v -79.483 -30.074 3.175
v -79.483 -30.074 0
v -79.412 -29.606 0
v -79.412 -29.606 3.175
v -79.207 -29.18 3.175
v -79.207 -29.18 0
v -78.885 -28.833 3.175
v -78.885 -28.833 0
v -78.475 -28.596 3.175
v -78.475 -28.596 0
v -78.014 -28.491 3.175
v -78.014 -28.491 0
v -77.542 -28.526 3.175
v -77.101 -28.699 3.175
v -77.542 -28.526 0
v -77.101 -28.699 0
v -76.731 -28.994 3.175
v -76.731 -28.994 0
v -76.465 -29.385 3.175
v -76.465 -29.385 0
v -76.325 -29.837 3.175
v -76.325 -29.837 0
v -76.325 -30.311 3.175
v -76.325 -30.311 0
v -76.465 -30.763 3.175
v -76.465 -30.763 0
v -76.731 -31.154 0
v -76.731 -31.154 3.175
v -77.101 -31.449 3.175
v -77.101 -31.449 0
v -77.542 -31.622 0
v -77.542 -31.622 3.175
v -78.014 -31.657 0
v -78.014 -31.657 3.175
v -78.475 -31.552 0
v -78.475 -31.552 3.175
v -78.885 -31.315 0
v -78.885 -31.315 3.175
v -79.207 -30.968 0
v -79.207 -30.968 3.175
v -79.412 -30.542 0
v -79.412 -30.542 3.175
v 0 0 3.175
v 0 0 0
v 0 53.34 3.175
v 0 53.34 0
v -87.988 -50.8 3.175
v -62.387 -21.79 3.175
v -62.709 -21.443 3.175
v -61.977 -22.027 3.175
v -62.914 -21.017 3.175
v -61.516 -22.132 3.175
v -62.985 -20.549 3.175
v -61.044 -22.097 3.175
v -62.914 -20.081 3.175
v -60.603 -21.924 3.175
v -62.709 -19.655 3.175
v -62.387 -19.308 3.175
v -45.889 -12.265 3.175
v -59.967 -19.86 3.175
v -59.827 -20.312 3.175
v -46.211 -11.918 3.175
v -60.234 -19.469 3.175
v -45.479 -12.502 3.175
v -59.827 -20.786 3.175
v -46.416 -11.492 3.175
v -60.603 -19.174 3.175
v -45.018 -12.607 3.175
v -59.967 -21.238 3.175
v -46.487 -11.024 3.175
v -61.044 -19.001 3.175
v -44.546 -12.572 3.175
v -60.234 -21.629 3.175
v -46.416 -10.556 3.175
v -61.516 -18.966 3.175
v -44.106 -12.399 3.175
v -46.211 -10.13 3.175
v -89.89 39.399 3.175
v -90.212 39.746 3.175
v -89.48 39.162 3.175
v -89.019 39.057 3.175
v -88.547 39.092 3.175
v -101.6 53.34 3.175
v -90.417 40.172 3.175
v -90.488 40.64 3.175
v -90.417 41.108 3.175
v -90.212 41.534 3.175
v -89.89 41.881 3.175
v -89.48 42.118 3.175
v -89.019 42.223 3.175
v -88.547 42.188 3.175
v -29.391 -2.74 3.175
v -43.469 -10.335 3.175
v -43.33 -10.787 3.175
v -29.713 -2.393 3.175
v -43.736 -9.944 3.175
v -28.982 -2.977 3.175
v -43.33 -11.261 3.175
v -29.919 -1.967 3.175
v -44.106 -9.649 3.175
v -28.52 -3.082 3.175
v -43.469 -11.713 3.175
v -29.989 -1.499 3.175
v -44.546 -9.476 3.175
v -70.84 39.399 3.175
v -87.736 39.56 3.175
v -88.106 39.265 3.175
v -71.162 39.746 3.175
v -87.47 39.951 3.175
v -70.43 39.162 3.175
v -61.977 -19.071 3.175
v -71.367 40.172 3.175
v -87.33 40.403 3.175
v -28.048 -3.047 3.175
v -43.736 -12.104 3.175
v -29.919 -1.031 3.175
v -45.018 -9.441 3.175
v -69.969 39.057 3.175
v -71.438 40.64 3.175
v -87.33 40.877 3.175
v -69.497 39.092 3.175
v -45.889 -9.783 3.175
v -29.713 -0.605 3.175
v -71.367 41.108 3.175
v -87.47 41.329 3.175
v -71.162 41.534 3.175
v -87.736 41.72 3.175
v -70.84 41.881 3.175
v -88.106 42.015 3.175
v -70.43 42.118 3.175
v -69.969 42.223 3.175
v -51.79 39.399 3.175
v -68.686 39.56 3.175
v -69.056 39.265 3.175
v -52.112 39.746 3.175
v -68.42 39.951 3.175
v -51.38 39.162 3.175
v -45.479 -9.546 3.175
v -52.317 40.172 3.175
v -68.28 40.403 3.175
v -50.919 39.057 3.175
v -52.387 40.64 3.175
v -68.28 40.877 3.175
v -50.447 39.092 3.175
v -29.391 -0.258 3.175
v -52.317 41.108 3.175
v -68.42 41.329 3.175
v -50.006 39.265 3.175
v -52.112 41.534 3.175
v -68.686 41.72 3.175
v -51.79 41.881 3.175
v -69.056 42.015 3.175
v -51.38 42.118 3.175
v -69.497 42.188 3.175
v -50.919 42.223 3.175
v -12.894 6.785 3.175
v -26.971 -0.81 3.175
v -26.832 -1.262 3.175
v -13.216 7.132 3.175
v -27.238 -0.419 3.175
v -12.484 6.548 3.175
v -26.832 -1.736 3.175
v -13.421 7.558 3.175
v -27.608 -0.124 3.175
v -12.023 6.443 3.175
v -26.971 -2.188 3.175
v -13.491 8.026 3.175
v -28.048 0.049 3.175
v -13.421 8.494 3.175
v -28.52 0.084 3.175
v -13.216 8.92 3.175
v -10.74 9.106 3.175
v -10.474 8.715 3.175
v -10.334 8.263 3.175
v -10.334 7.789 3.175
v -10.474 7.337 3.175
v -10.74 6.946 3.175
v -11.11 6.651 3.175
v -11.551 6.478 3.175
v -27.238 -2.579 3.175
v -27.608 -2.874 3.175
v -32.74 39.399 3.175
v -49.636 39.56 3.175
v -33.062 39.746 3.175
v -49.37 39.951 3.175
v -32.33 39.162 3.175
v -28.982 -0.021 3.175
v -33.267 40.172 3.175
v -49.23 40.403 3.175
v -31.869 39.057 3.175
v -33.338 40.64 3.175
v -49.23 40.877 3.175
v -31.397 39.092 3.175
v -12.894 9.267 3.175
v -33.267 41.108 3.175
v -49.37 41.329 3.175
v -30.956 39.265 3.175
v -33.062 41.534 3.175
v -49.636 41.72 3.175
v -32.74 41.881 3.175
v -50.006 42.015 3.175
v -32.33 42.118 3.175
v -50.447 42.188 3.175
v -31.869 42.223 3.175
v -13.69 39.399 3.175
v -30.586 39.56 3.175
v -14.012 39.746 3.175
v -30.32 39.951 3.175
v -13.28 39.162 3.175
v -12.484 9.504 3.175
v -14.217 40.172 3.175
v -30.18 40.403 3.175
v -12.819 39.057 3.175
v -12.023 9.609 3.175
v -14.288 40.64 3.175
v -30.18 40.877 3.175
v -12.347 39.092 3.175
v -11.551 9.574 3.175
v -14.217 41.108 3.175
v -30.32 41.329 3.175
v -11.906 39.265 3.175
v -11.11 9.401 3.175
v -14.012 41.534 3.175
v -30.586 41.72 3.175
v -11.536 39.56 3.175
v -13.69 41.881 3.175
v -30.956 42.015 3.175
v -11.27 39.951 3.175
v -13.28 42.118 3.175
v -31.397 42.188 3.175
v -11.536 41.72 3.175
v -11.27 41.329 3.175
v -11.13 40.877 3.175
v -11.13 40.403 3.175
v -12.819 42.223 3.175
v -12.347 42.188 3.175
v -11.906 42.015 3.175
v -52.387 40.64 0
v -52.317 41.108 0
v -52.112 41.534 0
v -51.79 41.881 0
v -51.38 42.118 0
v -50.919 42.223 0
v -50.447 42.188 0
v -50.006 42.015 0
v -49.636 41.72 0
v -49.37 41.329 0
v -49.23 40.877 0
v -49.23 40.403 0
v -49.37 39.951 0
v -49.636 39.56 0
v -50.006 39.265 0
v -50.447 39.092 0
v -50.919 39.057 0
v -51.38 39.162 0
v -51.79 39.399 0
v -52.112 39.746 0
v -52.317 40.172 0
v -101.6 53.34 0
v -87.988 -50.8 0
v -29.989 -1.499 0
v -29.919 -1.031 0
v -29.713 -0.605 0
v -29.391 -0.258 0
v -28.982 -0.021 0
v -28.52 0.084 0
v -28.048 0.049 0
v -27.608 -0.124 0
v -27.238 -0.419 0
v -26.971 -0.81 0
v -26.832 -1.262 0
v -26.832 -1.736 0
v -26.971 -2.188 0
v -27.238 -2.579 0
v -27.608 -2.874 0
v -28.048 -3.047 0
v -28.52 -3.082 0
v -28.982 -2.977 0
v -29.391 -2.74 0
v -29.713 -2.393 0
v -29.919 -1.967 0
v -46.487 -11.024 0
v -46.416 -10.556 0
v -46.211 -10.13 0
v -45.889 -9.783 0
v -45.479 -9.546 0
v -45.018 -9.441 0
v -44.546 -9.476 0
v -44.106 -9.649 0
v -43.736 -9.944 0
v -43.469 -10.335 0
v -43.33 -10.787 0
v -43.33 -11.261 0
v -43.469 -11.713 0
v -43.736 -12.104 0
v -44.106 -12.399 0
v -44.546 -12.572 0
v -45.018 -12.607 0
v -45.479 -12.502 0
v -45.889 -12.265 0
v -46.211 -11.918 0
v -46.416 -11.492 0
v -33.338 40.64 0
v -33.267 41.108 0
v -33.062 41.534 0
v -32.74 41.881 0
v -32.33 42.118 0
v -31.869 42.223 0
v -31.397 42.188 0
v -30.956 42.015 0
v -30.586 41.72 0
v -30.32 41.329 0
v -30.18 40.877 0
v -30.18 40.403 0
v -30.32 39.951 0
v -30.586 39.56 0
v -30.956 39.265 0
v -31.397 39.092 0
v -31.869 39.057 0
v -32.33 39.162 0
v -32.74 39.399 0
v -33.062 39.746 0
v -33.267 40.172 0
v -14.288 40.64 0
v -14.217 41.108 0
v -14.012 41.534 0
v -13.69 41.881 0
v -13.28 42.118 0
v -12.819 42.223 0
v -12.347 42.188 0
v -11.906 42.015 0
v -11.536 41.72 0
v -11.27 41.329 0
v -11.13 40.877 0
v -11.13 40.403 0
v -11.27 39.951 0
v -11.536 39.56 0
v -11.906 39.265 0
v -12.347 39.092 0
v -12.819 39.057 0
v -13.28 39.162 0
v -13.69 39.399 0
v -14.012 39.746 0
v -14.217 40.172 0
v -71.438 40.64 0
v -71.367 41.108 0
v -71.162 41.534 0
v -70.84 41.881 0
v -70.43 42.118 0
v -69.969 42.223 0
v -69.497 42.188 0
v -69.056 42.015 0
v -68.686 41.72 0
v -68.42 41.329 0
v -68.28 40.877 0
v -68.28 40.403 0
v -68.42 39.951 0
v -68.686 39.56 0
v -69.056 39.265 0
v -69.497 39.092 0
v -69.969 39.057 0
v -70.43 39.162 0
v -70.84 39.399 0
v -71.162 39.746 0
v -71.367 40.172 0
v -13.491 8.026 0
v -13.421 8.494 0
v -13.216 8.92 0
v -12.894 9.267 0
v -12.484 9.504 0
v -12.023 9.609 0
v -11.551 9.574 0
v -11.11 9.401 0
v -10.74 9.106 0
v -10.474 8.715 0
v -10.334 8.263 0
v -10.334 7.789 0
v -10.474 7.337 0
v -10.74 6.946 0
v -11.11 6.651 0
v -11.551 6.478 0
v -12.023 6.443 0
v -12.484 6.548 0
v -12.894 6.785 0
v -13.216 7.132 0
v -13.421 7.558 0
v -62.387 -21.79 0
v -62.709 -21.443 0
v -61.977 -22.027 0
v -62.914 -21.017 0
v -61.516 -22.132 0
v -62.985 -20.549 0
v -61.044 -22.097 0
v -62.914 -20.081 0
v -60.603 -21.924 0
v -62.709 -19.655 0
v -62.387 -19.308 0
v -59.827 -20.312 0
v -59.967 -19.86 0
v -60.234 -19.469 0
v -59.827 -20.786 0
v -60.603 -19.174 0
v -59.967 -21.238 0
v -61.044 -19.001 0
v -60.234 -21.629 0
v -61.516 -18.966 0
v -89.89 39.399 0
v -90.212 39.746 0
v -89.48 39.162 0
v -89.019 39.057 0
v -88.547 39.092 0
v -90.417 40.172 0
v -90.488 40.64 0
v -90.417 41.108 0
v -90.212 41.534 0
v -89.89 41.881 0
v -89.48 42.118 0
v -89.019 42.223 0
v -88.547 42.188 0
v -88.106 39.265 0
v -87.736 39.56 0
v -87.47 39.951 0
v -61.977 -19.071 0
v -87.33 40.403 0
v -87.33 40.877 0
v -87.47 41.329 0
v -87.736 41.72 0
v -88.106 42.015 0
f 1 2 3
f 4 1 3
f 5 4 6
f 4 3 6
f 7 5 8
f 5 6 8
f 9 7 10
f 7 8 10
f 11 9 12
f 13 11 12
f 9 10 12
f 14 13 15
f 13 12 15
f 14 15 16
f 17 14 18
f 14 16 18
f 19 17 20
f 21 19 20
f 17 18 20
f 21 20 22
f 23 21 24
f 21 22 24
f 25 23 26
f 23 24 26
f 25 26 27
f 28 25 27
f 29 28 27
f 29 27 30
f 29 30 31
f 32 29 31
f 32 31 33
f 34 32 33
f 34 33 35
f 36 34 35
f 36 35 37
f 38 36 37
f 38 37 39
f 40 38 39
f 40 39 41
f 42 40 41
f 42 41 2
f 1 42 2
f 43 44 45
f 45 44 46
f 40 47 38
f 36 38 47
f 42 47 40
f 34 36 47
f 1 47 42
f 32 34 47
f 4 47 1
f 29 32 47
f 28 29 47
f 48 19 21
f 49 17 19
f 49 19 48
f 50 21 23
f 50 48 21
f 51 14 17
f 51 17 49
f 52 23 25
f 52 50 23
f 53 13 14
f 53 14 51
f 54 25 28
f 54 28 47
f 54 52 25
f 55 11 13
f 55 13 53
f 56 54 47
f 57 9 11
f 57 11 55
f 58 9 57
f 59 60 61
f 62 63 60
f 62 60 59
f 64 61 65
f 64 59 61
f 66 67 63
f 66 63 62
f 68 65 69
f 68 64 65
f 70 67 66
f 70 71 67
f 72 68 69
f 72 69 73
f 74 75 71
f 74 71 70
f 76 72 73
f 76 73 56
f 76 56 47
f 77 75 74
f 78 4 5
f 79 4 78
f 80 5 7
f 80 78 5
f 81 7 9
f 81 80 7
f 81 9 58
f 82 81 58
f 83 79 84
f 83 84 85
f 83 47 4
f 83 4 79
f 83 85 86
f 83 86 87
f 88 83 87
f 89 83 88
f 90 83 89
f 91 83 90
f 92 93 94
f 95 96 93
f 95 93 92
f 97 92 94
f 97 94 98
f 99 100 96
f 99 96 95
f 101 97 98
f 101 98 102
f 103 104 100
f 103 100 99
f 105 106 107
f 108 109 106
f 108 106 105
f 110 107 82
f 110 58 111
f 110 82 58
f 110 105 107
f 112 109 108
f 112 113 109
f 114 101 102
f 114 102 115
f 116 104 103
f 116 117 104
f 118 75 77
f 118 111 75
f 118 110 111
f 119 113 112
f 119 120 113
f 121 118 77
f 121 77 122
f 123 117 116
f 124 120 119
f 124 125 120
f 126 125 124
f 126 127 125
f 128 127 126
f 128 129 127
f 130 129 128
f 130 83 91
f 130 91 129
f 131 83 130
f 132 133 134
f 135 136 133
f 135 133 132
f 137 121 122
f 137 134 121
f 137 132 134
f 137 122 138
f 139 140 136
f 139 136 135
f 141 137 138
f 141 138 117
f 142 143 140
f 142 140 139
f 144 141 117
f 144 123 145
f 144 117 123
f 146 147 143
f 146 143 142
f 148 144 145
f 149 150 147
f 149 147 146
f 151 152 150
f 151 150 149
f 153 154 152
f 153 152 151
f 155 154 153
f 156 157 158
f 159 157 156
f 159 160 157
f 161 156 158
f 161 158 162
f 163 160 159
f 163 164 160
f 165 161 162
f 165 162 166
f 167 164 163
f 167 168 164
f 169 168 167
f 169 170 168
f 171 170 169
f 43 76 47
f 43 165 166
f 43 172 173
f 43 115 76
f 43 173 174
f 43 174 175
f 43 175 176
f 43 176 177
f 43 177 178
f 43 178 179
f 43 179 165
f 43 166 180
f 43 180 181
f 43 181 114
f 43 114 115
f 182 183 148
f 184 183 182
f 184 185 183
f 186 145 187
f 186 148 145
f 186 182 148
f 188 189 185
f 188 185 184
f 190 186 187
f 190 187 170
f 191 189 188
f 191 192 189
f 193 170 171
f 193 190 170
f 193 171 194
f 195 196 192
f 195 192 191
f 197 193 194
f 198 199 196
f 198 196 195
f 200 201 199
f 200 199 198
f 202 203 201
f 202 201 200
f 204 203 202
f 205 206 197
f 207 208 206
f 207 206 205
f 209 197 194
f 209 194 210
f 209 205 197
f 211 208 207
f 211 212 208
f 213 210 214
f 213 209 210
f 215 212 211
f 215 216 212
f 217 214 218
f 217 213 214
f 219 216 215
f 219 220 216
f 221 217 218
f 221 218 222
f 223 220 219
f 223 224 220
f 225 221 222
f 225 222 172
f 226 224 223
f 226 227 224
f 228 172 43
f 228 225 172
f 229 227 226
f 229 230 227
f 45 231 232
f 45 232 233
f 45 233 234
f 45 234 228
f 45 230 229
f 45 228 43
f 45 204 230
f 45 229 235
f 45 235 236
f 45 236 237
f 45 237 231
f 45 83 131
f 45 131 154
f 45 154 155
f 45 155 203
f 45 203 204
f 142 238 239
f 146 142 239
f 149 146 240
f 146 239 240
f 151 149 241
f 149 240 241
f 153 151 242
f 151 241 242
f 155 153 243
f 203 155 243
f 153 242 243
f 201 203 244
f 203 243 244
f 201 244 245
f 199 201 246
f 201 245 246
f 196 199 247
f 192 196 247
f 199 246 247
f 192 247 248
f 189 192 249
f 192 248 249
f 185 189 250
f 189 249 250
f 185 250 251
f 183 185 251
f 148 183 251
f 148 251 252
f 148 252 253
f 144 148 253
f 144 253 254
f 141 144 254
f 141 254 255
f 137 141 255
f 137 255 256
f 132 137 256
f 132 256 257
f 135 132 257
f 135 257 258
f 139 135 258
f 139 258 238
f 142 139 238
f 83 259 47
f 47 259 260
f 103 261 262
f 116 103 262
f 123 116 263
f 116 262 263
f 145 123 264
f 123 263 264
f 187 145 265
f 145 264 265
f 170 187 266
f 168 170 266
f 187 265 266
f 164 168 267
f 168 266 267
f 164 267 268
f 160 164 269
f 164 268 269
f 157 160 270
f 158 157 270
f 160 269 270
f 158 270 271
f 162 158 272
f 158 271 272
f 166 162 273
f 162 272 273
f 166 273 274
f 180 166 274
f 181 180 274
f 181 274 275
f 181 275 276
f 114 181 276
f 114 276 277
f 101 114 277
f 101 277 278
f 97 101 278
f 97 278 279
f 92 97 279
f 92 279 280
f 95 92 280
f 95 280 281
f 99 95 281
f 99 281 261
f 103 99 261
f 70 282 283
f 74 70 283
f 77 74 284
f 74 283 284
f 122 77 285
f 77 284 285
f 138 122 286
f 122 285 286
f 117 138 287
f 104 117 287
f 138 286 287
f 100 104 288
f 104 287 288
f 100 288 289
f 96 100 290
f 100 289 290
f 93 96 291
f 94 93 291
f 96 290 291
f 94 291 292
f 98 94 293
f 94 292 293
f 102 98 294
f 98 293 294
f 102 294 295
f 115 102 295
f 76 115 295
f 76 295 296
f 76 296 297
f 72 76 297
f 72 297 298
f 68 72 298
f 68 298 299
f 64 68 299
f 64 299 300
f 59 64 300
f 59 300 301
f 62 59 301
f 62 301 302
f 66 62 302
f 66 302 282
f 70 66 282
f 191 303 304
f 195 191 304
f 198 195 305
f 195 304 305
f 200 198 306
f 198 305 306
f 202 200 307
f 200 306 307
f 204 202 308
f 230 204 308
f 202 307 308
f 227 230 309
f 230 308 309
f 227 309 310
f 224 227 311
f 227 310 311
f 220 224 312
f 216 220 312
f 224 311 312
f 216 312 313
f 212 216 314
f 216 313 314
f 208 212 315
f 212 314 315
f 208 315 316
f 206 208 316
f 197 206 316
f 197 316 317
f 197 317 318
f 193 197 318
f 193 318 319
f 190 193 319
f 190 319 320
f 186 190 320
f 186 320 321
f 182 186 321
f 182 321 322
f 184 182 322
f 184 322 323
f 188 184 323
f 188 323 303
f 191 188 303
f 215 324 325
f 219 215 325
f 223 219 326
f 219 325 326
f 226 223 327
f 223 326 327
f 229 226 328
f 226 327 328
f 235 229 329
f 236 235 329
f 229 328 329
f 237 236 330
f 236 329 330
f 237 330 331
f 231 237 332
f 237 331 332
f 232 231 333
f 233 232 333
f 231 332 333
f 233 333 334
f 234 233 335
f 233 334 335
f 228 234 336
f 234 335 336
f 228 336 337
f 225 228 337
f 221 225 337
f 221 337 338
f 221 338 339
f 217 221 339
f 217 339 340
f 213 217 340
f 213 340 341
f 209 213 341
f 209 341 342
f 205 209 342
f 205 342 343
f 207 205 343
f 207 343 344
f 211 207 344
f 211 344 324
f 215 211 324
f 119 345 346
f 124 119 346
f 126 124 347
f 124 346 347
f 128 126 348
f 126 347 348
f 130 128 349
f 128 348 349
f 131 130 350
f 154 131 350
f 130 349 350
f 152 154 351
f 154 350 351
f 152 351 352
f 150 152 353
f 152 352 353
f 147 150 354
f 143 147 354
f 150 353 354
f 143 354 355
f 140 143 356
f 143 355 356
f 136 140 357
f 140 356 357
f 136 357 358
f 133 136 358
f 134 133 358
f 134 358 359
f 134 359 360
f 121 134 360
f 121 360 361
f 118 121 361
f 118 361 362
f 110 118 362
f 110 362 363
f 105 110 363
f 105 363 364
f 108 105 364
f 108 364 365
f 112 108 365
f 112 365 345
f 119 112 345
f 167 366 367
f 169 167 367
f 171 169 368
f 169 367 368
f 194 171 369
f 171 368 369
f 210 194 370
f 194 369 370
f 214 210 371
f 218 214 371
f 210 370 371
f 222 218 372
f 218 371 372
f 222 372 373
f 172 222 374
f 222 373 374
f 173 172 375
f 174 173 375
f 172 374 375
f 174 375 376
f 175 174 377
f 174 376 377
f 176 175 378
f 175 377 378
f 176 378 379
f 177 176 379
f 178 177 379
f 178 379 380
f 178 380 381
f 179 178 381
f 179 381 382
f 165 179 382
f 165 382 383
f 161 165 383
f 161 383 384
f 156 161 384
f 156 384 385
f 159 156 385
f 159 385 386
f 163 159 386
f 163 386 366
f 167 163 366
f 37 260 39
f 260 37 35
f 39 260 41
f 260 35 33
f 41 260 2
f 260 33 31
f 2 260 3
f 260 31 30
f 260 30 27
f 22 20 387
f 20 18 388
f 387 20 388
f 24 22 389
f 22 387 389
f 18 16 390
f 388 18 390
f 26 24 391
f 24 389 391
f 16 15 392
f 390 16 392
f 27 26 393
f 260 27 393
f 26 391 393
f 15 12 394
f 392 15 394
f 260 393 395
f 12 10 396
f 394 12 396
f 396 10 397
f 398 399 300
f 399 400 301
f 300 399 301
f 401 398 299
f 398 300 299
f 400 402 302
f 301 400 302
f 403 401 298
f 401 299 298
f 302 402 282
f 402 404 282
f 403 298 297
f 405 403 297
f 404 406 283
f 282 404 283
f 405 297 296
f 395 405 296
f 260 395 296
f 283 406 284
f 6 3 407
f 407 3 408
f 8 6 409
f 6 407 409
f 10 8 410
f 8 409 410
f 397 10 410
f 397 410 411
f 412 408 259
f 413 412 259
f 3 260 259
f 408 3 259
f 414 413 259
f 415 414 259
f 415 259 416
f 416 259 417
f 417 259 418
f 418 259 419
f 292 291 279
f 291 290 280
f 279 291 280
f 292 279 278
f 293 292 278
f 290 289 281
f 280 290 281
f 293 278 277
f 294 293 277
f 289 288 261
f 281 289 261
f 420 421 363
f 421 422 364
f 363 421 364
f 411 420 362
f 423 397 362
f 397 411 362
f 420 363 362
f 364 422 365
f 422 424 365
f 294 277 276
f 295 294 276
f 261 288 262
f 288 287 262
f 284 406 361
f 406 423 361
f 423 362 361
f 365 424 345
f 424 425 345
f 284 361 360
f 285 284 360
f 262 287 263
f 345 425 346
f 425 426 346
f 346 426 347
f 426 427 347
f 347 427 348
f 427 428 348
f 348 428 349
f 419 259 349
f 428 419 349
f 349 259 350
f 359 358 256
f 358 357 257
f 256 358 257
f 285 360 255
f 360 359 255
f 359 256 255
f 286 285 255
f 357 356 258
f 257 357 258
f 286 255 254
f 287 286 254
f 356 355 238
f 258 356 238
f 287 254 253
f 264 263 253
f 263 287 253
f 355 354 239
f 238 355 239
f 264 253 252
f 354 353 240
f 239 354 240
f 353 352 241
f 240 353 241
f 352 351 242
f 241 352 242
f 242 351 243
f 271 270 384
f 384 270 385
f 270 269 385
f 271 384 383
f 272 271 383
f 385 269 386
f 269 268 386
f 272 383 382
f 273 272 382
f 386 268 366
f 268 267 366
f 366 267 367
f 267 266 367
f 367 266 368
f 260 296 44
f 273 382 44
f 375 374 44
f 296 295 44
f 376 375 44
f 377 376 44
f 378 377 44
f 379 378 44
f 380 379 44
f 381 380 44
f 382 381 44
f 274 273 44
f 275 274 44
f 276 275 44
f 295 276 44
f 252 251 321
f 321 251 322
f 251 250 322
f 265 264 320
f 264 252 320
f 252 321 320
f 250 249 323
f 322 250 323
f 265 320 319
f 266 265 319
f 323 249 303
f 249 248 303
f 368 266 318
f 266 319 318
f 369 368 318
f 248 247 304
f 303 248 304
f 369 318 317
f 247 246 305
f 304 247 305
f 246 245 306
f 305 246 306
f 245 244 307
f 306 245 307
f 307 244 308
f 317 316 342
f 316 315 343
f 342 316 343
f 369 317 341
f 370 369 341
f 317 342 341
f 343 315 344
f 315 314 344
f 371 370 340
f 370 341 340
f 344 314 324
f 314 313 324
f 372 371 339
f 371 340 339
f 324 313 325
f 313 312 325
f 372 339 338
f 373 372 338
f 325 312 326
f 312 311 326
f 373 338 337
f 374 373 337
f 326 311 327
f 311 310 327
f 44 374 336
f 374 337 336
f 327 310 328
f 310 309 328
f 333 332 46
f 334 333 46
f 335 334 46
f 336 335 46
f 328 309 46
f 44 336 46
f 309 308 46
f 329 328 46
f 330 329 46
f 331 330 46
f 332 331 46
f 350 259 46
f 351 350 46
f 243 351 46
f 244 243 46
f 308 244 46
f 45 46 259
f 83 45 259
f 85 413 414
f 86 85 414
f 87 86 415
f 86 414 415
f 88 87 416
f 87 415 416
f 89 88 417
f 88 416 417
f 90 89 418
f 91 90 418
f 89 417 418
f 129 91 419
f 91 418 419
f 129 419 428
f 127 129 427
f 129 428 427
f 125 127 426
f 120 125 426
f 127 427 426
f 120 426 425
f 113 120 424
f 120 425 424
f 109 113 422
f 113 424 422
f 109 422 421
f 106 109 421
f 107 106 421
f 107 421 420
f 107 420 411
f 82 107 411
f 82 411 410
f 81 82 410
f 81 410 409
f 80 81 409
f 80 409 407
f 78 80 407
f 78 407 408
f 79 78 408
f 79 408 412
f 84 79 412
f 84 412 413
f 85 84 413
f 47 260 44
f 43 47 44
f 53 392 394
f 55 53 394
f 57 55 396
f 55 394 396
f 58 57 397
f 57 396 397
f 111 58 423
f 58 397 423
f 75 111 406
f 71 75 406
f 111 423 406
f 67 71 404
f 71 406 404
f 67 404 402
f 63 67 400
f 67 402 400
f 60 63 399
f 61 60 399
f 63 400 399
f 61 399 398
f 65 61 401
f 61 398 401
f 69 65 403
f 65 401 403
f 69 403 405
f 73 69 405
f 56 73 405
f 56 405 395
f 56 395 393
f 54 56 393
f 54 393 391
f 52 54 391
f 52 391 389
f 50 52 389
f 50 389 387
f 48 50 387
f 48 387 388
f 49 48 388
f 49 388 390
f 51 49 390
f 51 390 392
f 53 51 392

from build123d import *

# Parameters (mm, degrees)
BOSS_EXTRUDE1_DEPTH = 3.175
CUT_EXTRUDE1_REACH  = 116.795
SKETCH2_R           = 1.5875


with BuildPart() as part:
    # Sketch1 → Boss-Extrude1 (new body)
    with BuildSketch(Plane.XY):
        Polygon((0, 0), (0, 53.34), (-101.6, 53.34), (-87.988181024, -50.8), align=None)
    extrude(amount=BOSS_EXTRUDE1_DEPTH)

    # Sketch2 → Cut-Extrude1 (cut, up to next)
    with BuildSketch(Plane(origin=(0, 0, 0), x_dir=(-1, 0, 0), z_dir=(0, 0, -1)), mode=Mode.PRIVATE) as cut_extrude1_sk1:
        with Locations((12.7, 40.64)):
            Circle(SKETCH2_R)
    cut_extrude1_tool1 = extrude(cut_extrude1_sk1.sketch, amount=-CUT_EXTRUDE1_REACH, mode=Mode.PRIVATE) & part.part
    # Sketch2 → Cut-Extrude1 (cut, up to next)
    with BuildSketch(Plane(origin=(0, 0, 0), x_dir=(-1, 0, 0), z_dir=(0, 0, -1)), mode=Mode.PRIVATE) as cut_extrude1_sk2:
        with Locations((31.75, 40.64)):
            Circle(SKETCH2_R)
    cut_extrude1_tool2 = extrude(cut_extrude1_sk2.sketch, amount=-CUT_EXTRUDE1_REACH, mode=Mode.PRIVATE) & part.part
    # Sketch2 → Cut-Extrude1 (cut, up to next)
    with BuildSketch(Plane(origin=(0, 0, 0), x_dir=(-1, 0, 0), z_dir=(0, 0, -1)), mode=Mode.PRIVATE) as cut_extrude1_sk3:
        with Locations((50.8, 40.64)):
            Circle(SKETCH2_R)
    cut_extrude1_tool3 = extrude(cut_extrude1_sk3.sketch, amount=-CUT_EXTRUDE1_REACH, mode=Mode.PRIVATE) & part.part
    # Sketch2 → Cut-Extrude1 (cut, up to next)
    with BuildSketch(Plane(origin=(0, 0, 0), x_dir=(-1, 0, 0), z_dir=(0, 0, -1)), mode=Mode.PRIVATE) as cut_extrude1_sk4:
        with Locations((69.85, 40.64)):
            Circle(SKETCH2_R)
    cut_extrude1_tool4 = extrude(cut_extrude1_sk4.sketch, amount=-CUT_EXTRUDE1_REACH, mode=Mode.PRIVATE) & part.part
    # Sketch2 → Cut-Extrude1 (cut, up to next)
    with BuildSketch(Plane(origin=(0, 0, 0), x_dir=(-1, 0, 0), z_dir=(0, 0, -1)), mode=Mode.PRIVATE) as cut_extrude1_sk5:
        with Locations((88.9, 40.64)):
            Circle(SKETCH2_R)
    cut_extrude1_tool5 = extrude(cut_extrude1_sk5.sketch, amount=-CUT_EXTRUDE1_REACH, mode=Mode.PRIVATE) & part.part
    # Sketch2 → Cut-Extrude1 (cut, up to next)
    with BuildSketch(Plane(origin=(0, 0, 0), x_dir=(-1, 0, 0), z_dir=(0, 0, -1)), mode=Mode.PRIVATE) as cut_extrude1_sk6:
        with Locations((11.903880744, 8.025962948)):
            Circle(SKETCH2_R)
    cut_extrude1_tool6 = extrude(cut_extrude1_sk6.sketch, amount=-CUT_EXTRUDE1_REACH, mode=Mode.PRIVATE) & part.part
    # Sketch2 → Cut-Extrude1 (cut, up to next)
    with BuildSketch(Plane(origin=(0, 0, 0), x_dir=(-1, 0, 0), z_dir=(0, 0, -1)), mode=Mode.PRIVATE) as cut_extrude1_sk7:
        with Locations((28.401664686, -1.499037052)):
            Circle(SKETCH2_R)
    cut_extrude1_tool7 = extrude(cut_extrude1_sk7.sketch, amount=-CUT_EXTRUDE1_REACH, mode=Mode.PRIVATE) & part.part
    # Sketch2 → Cut-Extrude1 (cut, up to next)
    with BuildSketch(Plane(origin=(0, 0, 0), x_dir=(-1, 0, 0), z_dir=(0, 0, -1)), mode=Mode.PRIVATE) as cut_extrude1_sk8:
        with Locations((44.899448628, -11.024037052)):
            Circle(SKETCH2_R)
    cut_extrude1_tool8 = extrude(cut_extrude1_sk8.sketch, amount=-CUT_EXTRUDE1_REACH, mode=Mode.PRIVATE) & part.part
    # Sketch2 → Cut-Extrude1 (cut, up to next)
    with BuildSketch(Plane(origin=(0, 0, 0), x_dir=(-1, 0, 0), z_dir=(0, 0, -1)), mode=Mode.PRIVATE) as cut_extrude1_sk9:
        with Locations((61.39723257, -20.549037052)):
            Circle(SKETCH2_R)
    cut_extrude1_tool9 = extrude(cut_extrude1_sk9.sketch, amount=-CUT_EXTRUDE1_REACH, mode=Mode.PRIVATE) & part.part
    # Sketch2 → Cut-Extrude1 (cut, up to next)
    with BuildSketch(Plane(origin=(0, 0, 0), x_dir=(-1, 0, 0), z_dir=(0, 0, -1)), mode=Mode.PRIVATE) as cut_extrude1_sk10:
        with Locations((77.895016512, -30.074037052)):
            Circle(SKETCH2_R)
    cut_extrude1_tool10 = extrude(cut_extrude1_sk10.sketch, amount=-CUT_EXTRUDE1_REACH, mode=Mode.PRIVATE) & part.part
    add(cut_extrude1_tool1.solids().sort_by_distance((-12.7, 40.64, 0))[0], mode=Mode.SUBTRACT)
    add(cut_extrude1_tool2.solids().sort_by_distance((-31.75, 40.64, 0))[0], mode=Mode.SUBTRACT)
    add(cut_extrude1_tool3.solids().sort_by_distance((-50.8, 40.64, 0))[0], mode=Mode.SUBTRACT)
    add(cut_extrude1_tool4.solids().sort_by_distance((-69.85, 40.64, 0))[0], mode=Mode.SUBTRACT)
    add(cut_extrude1_tool5.solids().sort_by_distance((-88.9, 40.64, 0))[0], mode=Mode.SUBTRACT)
    add(cut_extrude1_tool6.solids().sort_by_distance((-11.903881, 8.025963, 0))[0], mode=Mode.SUBTRACT)
    add(cut_extrude1_tool7.solids().sort_by_distance((-28.401665, -1.499037, 0))[0], mode=Mode.SUBTRACT)
    add(cut_extrude1_tool8.solids().sort_by_distance((-44.899449, -11.024037, 0))[0], mode=Mode.SUBTRACT)
    add(cut_extrude1_tool9.solids().sort_by_distance((-61.397233, -20.549037, 0))[0], mode=Mode.SUBTRACT)
    add(cut_extrude1_tool10.solids().sort_by_distance((-77.895017, -30.074037, 0))[0], mode=Mode.SUBTRACT)


solid = part.part
